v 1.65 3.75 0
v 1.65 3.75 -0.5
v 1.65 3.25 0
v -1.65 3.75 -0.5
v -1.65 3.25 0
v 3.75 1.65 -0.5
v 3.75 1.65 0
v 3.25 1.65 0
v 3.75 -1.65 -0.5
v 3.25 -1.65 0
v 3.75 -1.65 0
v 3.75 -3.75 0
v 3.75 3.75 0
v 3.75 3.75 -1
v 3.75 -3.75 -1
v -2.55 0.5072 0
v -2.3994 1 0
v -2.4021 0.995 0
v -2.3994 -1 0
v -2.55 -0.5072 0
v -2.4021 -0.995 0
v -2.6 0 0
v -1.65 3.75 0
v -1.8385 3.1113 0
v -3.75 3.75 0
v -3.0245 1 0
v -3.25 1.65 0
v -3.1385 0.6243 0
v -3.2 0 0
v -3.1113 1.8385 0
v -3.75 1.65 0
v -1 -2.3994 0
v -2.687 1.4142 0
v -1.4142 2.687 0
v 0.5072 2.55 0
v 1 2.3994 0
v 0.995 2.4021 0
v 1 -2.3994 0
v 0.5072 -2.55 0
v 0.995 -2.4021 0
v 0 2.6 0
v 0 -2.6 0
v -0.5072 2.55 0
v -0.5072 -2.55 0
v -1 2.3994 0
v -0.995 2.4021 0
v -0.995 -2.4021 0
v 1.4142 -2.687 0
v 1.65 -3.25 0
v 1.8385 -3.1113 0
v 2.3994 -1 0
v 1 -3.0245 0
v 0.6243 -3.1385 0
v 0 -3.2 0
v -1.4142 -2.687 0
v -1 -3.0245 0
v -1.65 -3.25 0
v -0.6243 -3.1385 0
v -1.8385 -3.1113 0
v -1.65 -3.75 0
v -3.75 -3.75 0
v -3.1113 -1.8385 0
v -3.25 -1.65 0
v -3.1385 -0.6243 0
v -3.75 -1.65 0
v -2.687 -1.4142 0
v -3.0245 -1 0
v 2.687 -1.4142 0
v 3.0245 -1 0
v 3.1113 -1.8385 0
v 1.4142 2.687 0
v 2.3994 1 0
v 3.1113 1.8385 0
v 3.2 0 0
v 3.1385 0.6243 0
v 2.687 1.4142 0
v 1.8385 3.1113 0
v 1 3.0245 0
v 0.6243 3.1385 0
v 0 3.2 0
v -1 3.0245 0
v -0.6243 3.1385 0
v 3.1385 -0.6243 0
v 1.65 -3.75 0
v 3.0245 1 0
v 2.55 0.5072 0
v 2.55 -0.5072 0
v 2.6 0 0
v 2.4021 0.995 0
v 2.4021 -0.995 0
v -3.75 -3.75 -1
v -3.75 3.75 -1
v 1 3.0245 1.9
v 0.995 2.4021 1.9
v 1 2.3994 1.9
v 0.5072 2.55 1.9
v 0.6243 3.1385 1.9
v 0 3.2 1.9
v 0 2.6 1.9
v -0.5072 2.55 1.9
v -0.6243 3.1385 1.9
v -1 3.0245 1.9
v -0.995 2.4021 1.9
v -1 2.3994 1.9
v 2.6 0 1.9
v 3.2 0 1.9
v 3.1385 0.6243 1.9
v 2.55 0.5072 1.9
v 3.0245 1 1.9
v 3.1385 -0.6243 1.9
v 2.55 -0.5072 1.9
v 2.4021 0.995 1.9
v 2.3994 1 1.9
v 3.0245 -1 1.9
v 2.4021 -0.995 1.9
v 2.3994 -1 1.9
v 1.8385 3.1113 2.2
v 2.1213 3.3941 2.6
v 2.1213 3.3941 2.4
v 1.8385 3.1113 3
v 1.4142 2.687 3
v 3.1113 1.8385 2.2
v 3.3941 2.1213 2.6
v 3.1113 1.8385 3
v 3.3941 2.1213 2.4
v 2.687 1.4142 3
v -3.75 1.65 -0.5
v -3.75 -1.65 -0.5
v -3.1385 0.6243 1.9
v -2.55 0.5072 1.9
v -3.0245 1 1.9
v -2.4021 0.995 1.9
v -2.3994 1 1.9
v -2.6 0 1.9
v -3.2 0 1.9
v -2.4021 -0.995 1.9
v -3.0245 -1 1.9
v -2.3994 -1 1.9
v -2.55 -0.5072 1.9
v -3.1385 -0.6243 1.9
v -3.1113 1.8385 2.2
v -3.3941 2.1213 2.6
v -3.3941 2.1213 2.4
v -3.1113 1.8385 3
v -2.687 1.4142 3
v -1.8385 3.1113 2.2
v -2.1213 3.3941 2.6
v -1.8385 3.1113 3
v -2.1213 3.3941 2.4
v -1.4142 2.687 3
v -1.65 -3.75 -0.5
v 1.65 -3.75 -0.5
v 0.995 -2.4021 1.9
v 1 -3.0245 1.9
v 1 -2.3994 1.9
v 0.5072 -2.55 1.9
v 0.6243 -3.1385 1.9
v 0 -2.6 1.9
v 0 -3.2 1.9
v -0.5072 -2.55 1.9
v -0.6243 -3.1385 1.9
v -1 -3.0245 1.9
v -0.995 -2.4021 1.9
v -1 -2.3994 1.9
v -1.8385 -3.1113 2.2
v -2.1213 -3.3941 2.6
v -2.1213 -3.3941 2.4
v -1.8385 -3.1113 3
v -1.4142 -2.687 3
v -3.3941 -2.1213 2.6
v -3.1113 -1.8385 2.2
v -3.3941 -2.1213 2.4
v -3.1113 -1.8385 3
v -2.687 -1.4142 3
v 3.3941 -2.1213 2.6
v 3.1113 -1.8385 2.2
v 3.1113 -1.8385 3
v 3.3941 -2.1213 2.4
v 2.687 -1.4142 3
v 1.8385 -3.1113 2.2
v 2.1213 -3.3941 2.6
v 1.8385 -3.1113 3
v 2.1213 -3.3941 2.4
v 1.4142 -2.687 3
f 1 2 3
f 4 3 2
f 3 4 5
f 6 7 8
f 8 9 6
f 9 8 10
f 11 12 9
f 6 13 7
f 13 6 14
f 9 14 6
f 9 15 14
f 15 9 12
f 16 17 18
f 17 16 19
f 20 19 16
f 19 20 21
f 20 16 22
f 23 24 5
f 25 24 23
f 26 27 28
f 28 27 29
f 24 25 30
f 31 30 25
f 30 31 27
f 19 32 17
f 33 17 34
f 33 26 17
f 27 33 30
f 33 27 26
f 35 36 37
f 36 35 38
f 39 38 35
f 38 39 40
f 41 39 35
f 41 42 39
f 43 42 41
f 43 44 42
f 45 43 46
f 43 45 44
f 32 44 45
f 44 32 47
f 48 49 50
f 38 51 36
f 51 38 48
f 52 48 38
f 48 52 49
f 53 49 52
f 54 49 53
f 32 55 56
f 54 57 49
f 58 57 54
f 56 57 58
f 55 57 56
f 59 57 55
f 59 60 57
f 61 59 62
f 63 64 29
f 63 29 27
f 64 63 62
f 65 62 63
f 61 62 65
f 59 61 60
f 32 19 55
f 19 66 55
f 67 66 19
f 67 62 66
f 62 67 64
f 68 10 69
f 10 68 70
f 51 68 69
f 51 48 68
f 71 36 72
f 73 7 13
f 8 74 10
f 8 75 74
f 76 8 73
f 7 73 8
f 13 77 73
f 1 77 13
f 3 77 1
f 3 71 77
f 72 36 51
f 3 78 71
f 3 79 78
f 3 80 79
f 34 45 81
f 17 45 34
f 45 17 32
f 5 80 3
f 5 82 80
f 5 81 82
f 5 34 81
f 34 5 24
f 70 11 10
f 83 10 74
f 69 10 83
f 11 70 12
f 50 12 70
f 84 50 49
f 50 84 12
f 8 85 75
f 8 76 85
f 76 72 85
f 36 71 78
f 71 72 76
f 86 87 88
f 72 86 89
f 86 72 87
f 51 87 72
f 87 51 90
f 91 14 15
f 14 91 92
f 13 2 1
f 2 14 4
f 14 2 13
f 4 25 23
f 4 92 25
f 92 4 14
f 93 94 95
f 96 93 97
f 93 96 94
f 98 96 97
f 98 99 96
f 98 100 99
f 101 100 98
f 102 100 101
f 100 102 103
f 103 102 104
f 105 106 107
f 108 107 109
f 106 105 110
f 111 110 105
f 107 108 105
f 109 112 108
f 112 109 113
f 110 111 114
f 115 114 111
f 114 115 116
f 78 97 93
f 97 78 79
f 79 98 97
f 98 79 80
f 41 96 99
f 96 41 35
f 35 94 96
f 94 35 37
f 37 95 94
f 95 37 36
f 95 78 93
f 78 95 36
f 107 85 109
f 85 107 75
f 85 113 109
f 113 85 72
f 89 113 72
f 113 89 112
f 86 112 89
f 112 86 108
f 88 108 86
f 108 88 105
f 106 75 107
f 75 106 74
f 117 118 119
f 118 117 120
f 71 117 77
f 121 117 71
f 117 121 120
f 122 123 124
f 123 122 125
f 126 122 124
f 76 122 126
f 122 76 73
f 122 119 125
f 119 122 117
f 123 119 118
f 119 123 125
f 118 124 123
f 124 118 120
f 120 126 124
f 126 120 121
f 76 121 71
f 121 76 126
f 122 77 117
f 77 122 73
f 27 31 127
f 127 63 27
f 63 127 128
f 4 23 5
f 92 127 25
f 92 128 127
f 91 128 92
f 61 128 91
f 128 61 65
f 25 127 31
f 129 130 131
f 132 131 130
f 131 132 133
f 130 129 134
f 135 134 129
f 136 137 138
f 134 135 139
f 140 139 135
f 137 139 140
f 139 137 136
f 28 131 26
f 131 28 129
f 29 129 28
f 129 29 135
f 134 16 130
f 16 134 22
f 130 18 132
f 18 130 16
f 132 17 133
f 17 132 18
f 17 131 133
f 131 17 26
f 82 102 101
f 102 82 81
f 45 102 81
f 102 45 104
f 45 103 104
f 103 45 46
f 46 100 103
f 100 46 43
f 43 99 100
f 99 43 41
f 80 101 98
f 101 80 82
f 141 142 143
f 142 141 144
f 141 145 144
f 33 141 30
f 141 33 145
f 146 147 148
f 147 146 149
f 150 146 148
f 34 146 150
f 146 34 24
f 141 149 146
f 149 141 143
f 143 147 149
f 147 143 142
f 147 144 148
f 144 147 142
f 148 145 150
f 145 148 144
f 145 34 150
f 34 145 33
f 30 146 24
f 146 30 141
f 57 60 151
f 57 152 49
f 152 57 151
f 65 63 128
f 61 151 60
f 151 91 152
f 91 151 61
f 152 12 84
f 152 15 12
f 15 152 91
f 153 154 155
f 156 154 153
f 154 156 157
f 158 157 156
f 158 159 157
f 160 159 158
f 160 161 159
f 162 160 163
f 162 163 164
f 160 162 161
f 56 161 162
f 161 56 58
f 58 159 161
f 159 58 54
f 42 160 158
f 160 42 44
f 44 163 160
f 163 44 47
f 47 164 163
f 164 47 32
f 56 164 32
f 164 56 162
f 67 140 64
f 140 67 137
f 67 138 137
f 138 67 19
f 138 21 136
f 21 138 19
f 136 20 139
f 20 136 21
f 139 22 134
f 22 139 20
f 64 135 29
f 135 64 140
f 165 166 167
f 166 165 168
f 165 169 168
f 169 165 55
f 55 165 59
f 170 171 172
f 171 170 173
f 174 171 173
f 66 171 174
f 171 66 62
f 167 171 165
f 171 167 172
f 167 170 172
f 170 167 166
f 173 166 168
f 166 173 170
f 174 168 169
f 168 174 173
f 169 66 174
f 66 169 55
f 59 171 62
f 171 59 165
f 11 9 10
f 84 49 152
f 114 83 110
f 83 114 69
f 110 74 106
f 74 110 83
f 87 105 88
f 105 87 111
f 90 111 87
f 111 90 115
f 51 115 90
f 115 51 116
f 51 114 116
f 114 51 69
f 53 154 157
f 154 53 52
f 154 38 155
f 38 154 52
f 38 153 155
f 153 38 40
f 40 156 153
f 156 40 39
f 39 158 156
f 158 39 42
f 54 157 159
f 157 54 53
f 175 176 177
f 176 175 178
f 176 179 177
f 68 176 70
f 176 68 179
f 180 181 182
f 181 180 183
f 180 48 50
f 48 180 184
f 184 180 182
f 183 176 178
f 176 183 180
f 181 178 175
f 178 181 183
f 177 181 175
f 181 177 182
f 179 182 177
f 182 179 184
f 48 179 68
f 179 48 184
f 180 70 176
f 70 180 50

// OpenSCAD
$fn=32;

HACK=0.001;

module corner(rot) {
  
  w = 7.5;
  d = 1;
  chamfer_width = 3.3;
  low_depth = 1.9;
  
  rotate([0,0,rot]) {
    
    // Bottom pad, with chamfer
    difference() {
      translate([0, 0, -1])
        cube([w/2, w/2, d]);
      
      for (side = [0, -90]) {
        rotate([0, 0, side])
        translate([0, w/2, -d/2])
          rotate([45, 0, 0])
          translate([-chamfer_width/2,0, -1])
          cube([chamfer_width, 2, 2]);
      }
    }
    
    // Low guide
    linear_extrude(low_depth)
    difference() {
      circle(d=6.4, center=true);
      circle(d=5.2, center=true);
      translate([-10,-5])
        square(10);
      translate([-5,-10])
        square(10);
      translate([1, 1])
        square(10);
    }
    
    // High clip
    rotate([0,0,45])
    translate([(5.8/2), 0, 0])
    rotate([90, 0, 0])
    linear_extrude(1.8, center=true){
      polygon([
        [0, 0],
        [0, 3],
        [0.6, 3],
        [1, 2.6],
        [1, 2.4],
        [0.6, 2.2],
        [0.6, 0]
      
      ]);
    }
  }
}


module screw_cover() {
  for (a = [0, 90, 180, 270])
    corner(a);
  
  
}


screw_cover();
